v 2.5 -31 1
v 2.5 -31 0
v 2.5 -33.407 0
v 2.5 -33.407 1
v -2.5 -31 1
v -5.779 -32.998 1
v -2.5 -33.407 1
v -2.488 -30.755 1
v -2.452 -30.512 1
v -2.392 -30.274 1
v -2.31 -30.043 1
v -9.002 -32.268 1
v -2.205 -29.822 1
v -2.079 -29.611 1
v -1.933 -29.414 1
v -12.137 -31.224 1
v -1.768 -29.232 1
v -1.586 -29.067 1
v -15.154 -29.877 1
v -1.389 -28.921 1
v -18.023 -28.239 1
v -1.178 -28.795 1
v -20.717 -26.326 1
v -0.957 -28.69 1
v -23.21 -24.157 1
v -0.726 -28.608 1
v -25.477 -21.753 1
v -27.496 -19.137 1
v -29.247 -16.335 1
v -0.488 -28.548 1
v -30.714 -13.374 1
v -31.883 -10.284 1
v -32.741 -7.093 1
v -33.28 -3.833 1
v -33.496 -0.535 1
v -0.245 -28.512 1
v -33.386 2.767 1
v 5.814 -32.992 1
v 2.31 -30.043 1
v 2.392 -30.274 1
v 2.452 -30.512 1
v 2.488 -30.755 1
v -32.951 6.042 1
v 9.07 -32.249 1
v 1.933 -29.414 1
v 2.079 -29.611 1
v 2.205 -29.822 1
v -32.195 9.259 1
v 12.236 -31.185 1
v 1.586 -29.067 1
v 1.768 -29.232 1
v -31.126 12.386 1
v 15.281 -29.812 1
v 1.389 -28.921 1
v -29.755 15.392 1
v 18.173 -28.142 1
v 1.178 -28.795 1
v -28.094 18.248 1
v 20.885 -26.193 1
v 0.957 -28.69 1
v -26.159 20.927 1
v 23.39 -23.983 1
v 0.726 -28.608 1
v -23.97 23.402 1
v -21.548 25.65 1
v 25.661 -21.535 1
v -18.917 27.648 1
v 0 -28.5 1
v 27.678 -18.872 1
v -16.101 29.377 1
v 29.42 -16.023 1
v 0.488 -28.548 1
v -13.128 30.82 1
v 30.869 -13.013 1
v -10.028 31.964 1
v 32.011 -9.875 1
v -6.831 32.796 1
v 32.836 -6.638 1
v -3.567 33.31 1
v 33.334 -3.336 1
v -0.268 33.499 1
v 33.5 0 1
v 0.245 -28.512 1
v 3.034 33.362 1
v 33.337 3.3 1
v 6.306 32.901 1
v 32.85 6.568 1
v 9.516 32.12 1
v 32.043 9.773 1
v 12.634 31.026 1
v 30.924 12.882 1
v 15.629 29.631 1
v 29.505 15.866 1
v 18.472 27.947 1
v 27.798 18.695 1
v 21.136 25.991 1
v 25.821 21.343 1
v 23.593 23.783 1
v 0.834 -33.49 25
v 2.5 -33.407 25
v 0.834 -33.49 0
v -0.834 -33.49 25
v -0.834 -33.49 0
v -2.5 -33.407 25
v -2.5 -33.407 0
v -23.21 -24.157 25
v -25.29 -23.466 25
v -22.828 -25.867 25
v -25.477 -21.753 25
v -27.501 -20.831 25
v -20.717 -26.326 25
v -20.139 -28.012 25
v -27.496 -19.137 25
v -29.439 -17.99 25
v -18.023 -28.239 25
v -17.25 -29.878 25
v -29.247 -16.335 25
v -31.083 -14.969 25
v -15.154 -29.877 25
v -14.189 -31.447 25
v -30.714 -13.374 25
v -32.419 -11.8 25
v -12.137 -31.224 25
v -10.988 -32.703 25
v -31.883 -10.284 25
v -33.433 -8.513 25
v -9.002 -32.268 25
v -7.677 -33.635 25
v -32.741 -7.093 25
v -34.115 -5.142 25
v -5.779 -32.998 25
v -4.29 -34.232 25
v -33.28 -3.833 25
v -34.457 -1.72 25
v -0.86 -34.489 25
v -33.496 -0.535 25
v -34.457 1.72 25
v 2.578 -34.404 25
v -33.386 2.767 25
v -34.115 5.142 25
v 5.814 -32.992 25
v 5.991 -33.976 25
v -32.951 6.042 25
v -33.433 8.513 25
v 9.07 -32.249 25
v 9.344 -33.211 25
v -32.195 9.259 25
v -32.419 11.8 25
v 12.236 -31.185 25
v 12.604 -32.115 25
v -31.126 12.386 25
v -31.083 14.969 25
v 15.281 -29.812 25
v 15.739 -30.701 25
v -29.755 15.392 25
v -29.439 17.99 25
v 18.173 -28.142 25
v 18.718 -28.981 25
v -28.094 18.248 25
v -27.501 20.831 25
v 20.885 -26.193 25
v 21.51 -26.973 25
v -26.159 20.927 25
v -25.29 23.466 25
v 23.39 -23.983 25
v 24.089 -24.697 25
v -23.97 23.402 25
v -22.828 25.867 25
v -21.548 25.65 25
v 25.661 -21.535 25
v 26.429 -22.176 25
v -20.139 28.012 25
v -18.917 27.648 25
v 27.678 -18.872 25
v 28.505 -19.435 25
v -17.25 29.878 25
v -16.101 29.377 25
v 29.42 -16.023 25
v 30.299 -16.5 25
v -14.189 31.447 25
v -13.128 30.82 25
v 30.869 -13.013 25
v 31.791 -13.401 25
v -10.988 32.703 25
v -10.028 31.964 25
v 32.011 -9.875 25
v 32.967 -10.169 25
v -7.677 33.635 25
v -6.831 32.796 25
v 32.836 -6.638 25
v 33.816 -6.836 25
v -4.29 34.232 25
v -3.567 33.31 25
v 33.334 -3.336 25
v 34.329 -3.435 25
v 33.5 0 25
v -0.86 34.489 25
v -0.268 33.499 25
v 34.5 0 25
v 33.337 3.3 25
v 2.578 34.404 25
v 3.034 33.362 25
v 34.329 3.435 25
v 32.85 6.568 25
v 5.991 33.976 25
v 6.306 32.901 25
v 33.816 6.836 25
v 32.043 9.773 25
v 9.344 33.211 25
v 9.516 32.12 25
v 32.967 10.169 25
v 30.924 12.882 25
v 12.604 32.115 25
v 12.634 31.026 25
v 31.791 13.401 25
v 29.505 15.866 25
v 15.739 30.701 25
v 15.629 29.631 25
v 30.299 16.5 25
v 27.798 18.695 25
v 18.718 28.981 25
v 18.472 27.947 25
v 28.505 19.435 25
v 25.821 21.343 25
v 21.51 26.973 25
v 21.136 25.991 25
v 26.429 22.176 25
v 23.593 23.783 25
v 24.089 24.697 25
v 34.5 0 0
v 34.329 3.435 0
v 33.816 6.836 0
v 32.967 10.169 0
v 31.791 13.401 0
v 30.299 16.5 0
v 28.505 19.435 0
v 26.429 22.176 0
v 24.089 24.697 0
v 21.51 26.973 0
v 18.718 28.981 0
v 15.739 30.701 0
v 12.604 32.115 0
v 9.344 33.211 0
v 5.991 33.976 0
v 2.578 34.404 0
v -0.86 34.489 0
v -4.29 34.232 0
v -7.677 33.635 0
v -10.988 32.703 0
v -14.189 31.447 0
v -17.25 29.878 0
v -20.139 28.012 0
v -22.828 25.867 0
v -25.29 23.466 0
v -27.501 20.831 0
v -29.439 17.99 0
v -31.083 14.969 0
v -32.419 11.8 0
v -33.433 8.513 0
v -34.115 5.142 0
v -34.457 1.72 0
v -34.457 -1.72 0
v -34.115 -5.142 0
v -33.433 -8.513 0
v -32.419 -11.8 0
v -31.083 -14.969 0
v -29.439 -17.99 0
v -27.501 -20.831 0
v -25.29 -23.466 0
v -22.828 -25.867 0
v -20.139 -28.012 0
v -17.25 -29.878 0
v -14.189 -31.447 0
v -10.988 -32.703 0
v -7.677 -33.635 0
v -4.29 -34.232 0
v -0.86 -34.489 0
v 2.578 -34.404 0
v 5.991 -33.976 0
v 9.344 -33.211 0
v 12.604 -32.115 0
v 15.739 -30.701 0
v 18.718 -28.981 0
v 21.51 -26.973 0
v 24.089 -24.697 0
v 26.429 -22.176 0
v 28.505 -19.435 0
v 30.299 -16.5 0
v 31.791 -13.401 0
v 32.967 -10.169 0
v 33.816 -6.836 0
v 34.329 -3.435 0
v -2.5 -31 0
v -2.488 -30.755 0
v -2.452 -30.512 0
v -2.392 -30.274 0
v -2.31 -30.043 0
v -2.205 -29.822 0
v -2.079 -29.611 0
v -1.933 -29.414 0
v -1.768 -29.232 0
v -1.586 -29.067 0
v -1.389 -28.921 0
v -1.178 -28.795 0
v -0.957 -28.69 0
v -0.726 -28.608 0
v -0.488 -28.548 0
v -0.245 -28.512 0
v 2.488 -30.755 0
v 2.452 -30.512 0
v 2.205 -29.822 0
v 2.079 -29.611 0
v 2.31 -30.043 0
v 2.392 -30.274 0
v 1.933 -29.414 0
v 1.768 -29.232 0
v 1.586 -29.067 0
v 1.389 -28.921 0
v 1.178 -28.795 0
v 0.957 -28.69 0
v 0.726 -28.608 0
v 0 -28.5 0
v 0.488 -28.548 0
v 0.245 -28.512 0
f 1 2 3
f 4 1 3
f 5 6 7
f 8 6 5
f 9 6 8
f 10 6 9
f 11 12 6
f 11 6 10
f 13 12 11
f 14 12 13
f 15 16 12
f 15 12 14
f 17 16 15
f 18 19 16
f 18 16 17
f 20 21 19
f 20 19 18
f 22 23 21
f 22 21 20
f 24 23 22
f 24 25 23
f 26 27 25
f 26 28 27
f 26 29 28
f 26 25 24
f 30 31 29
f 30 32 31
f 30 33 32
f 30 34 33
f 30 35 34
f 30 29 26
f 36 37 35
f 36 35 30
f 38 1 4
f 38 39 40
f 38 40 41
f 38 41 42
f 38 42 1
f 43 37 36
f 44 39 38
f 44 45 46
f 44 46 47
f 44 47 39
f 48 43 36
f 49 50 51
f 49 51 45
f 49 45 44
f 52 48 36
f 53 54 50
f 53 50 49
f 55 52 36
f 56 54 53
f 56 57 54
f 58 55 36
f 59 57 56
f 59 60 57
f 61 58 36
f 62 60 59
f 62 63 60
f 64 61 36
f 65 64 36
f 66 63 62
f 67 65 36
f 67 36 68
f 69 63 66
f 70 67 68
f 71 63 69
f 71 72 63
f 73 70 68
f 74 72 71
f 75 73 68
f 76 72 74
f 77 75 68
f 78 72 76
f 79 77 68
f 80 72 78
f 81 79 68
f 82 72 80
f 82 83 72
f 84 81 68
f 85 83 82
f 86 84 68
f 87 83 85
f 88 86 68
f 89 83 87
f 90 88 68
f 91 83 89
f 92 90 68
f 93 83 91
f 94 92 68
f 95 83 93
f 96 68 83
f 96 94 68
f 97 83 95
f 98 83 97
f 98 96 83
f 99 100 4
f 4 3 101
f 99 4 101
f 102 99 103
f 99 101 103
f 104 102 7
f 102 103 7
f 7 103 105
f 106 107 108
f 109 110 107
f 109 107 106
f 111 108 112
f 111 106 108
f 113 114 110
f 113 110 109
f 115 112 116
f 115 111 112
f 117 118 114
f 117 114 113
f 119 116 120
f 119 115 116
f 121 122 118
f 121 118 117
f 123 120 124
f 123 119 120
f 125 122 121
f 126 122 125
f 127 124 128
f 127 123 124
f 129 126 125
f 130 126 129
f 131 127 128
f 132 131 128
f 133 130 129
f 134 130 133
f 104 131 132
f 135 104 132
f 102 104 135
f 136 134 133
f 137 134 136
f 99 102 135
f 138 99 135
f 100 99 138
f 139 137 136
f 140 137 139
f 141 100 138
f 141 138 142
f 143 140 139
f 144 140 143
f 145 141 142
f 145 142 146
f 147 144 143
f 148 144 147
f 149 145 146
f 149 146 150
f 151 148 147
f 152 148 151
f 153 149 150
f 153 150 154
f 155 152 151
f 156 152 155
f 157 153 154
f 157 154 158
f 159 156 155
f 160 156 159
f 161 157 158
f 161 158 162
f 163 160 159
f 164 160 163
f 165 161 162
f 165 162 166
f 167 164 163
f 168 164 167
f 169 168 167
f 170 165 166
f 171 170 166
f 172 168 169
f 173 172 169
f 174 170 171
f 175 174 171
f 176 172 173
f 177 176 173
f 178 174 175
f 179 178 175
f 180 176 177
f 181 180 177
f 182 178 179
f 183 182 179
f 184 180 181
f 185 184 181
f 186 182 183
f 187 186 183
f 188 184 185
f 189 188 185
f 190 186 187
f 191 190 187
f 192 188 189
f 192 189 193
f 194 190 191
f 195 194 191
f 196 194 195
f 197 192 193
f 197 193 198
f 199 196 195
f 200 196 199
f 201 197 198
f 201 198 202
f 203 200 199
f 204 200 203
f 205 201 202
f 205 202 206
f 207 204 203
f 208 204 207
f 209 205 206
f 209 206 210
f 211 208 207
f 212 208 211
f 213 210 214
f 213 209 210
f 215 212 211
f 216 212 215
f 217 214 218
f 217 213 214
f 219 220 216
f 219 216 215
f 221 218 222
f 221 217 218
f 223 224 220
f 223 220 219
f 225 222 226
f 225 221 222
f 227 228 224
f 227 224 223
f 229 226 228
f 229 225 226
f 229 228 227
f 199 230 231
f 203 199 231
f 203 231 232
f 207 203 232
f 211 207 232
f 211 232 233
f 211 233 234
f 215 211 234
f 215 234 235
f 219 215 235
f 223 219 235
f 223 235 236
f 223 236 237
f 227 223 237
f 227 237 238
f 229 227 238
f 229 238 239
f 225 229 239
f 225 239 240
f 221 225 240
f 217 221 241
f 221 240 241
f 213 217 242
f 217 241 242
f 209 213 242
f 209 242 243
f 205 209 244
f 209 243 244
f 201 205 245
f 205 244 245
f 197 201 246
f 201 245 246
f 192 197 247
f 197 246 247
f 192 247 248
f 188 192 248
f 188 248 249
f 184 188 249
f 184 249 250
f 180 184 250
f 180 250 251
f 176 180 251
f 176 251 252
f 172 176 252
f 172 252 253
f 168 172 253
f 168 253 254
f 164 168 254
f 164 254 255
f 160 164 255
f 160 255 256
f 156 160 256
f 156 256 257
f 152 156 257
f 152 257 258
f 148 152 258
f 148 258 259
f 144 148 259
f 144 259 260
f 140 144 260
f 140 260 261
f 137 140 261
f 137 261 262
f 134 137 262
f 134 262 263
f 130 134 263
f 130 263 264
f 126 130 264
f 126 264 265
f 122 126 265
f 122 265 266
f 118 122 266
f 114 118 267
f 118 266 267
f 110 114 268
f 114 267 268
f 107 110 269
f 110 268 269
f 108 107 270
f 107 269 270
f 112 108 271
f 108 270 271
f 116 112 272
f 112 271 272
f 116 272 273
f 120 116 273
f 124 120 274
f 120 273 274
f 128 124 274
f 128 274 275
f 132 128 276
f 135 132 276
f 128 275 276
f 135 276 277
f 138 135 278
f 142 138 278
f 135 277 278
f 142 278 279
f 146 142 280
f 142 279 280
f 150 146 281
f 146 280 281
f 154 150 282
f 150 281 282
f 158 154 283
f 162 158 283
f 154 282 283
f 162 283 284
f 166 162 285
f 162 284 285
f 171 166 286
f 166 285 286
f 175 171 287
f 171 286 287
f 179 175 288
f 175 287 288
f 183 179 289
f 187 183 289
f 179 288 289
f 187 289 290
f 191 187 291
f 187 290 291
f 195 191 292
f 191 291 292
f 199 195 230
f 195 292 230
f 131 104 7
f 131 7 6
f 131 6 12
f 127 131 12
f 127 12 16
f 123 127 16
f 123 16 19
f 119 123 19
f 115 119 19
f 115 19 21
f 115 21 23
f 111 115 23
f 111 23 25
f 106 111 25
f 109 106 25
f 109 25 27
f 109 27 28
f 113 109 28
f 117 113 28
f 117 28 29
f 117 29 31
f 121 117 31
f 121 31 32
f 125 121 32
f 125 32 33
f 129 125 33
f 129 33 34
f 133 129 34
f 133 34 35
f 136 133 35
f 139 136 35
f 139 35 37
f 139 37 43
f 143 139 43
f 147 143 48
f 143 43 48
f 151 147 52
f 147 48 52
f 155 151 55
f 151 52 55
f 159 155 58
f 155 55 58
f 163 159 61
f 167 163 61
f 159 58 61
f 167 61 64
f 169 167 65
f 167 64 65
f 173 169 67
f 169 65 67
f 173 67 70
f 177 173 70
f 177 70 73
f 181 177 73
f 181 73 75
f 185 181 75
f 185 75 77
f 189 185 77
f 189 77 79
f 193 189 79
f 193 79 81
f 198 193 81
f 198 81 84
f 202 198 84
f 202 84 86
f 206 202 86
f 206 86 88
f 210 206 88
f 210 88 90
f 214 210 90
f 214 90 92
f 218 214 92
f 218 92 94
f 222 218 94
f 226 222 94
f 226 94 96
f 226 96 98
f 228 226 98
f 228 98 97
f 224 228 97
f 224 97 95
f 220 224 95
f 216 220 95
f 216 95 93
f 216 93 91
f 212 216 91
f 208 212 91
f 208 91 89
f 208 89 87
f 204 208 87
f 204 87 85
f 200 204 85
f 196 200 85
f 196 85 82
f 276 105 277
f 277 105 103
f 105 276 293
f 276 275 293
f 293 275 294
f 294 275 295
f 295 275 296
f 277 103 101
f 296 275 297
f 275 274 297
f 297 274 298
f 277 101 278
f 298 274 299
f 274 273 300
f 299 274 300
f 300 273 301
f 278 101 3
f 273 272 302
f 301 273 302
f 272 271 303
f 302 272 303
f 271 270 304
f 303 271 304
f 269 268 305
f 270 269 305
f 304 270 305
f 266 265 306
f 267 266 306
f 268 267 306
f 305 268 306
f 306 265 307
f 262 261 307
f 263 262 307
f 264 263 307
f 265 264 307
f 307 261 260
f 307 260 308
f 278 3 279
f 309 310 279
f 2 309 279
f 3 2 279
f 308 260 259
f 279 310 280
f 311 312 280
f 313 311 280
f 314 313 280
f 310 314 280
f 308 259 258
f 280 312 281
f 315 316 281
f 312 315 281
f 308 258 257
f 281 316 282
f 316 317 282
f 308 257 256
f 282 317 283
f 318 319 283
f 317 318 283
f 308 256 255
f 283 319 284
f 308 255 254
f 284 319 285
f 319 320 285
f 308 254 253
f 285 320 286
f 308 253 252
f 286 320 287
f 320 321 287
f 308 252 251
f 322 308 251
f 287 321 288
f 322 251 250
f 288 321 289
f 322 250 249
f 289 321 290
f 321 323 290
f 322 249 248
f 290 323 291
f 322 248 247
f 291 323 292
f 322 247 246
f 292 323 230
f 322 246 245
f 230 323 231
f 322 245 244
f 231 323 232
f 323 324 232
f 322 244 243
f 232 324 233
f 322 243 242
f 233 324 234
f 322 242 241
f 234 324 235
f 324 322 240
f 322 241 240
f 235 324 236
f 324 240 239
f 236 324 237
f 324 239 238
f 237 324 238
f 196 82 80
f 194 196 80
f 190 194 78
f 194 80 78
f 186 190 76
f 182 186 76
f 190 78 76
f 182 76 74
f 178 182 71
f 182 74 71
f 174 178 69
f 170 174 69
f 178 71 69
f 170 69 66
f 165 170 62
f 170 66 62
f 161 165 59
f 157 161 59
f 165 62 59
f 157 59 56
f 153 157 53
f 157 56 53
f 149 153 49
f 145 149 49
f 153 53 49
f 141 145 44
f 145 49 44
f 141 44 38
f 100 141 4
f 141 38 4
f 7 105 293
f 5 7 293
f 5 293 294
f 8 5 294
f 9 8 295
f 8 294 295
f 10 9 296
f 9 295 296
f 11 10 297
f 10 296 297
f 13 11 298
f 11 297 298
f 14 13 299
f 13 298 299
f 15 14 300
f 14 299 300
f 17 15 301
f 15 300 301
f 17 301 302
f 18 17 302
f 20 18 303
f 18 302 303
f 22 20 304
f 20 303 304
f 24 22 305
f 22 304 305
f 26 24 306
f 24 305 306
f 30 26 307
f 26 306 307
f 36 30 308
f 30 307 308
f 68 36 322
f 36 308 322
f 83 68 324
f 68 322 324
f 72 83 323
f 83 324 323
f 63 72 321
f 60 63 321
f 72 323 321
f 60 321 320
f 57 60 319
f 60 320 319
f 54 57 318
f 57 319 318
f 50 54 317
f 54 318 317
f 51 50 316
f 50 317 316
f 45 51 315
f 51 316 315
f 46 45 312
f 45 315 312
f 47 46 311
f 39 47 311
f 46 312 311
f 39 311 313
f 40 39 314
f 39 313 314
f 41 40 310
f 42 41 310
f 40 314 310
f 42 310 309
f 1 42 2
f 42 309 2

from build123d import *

# Parameters (mm, degrees)
F0_R     = 34.5
F1_DEPTH = 1
F2_DEPTH = 25


with BuildPart() as f1:
    # F0 (on Top) → F1 (new body)
    with BuildSketch(Plane.XY):
        Circle(F0_R)
        with BuildLine():
            ThreePointArc((-2.5, -33.406586), (-22.787058, 24.556058), (33.5, 0))
            ThreePointArc((33.5, 0), (24.556058, -22.787058), (2.5, -33.406586))
            ThreePointArc((2.5, -33.406586), (0, -33.5), (-2.5, -33.406586))
        make_face(mode=Mode.SUBTRACT)
        with BuildLine():
            ThreePointArc((2.5, -33.406586), (24.556058, -22.787058), (33.5, 0))
            ThreePointArc((33.5, 0), (-22.787058, 24.556058), (-2.5, -33.406586))
            Line((-2.5, -33.406586), (-2.5, -31))
            ThreePointArc((-2.5, -31), (0, -28.5), (2.5, -31))
            Line((2.5, -31), (2.5, -33.406586))
        make_face()
    extrude(amount=F1_DEPTH)

    # F0 (on Top) → F2 (join)
    with BuildSketch(Plane.XY):
        Circle(F0_R)
        with BuildLine():
            ThreePointArc((-2.5, -33.406586), (-22.787058, 24.556058), (33.5, 0))
            ThreePointArc((33.5, 0), (24.556058, -22.787058), (2.5, -33.406586))
            ThreePointArc((2.5, -33.406586), (0, -33.5), (-2.5, -33.406586))
        make_face(mode=Mode.SUBTRACT)
    extrude(amount=F2_DEPTH)


solid = f1.part
